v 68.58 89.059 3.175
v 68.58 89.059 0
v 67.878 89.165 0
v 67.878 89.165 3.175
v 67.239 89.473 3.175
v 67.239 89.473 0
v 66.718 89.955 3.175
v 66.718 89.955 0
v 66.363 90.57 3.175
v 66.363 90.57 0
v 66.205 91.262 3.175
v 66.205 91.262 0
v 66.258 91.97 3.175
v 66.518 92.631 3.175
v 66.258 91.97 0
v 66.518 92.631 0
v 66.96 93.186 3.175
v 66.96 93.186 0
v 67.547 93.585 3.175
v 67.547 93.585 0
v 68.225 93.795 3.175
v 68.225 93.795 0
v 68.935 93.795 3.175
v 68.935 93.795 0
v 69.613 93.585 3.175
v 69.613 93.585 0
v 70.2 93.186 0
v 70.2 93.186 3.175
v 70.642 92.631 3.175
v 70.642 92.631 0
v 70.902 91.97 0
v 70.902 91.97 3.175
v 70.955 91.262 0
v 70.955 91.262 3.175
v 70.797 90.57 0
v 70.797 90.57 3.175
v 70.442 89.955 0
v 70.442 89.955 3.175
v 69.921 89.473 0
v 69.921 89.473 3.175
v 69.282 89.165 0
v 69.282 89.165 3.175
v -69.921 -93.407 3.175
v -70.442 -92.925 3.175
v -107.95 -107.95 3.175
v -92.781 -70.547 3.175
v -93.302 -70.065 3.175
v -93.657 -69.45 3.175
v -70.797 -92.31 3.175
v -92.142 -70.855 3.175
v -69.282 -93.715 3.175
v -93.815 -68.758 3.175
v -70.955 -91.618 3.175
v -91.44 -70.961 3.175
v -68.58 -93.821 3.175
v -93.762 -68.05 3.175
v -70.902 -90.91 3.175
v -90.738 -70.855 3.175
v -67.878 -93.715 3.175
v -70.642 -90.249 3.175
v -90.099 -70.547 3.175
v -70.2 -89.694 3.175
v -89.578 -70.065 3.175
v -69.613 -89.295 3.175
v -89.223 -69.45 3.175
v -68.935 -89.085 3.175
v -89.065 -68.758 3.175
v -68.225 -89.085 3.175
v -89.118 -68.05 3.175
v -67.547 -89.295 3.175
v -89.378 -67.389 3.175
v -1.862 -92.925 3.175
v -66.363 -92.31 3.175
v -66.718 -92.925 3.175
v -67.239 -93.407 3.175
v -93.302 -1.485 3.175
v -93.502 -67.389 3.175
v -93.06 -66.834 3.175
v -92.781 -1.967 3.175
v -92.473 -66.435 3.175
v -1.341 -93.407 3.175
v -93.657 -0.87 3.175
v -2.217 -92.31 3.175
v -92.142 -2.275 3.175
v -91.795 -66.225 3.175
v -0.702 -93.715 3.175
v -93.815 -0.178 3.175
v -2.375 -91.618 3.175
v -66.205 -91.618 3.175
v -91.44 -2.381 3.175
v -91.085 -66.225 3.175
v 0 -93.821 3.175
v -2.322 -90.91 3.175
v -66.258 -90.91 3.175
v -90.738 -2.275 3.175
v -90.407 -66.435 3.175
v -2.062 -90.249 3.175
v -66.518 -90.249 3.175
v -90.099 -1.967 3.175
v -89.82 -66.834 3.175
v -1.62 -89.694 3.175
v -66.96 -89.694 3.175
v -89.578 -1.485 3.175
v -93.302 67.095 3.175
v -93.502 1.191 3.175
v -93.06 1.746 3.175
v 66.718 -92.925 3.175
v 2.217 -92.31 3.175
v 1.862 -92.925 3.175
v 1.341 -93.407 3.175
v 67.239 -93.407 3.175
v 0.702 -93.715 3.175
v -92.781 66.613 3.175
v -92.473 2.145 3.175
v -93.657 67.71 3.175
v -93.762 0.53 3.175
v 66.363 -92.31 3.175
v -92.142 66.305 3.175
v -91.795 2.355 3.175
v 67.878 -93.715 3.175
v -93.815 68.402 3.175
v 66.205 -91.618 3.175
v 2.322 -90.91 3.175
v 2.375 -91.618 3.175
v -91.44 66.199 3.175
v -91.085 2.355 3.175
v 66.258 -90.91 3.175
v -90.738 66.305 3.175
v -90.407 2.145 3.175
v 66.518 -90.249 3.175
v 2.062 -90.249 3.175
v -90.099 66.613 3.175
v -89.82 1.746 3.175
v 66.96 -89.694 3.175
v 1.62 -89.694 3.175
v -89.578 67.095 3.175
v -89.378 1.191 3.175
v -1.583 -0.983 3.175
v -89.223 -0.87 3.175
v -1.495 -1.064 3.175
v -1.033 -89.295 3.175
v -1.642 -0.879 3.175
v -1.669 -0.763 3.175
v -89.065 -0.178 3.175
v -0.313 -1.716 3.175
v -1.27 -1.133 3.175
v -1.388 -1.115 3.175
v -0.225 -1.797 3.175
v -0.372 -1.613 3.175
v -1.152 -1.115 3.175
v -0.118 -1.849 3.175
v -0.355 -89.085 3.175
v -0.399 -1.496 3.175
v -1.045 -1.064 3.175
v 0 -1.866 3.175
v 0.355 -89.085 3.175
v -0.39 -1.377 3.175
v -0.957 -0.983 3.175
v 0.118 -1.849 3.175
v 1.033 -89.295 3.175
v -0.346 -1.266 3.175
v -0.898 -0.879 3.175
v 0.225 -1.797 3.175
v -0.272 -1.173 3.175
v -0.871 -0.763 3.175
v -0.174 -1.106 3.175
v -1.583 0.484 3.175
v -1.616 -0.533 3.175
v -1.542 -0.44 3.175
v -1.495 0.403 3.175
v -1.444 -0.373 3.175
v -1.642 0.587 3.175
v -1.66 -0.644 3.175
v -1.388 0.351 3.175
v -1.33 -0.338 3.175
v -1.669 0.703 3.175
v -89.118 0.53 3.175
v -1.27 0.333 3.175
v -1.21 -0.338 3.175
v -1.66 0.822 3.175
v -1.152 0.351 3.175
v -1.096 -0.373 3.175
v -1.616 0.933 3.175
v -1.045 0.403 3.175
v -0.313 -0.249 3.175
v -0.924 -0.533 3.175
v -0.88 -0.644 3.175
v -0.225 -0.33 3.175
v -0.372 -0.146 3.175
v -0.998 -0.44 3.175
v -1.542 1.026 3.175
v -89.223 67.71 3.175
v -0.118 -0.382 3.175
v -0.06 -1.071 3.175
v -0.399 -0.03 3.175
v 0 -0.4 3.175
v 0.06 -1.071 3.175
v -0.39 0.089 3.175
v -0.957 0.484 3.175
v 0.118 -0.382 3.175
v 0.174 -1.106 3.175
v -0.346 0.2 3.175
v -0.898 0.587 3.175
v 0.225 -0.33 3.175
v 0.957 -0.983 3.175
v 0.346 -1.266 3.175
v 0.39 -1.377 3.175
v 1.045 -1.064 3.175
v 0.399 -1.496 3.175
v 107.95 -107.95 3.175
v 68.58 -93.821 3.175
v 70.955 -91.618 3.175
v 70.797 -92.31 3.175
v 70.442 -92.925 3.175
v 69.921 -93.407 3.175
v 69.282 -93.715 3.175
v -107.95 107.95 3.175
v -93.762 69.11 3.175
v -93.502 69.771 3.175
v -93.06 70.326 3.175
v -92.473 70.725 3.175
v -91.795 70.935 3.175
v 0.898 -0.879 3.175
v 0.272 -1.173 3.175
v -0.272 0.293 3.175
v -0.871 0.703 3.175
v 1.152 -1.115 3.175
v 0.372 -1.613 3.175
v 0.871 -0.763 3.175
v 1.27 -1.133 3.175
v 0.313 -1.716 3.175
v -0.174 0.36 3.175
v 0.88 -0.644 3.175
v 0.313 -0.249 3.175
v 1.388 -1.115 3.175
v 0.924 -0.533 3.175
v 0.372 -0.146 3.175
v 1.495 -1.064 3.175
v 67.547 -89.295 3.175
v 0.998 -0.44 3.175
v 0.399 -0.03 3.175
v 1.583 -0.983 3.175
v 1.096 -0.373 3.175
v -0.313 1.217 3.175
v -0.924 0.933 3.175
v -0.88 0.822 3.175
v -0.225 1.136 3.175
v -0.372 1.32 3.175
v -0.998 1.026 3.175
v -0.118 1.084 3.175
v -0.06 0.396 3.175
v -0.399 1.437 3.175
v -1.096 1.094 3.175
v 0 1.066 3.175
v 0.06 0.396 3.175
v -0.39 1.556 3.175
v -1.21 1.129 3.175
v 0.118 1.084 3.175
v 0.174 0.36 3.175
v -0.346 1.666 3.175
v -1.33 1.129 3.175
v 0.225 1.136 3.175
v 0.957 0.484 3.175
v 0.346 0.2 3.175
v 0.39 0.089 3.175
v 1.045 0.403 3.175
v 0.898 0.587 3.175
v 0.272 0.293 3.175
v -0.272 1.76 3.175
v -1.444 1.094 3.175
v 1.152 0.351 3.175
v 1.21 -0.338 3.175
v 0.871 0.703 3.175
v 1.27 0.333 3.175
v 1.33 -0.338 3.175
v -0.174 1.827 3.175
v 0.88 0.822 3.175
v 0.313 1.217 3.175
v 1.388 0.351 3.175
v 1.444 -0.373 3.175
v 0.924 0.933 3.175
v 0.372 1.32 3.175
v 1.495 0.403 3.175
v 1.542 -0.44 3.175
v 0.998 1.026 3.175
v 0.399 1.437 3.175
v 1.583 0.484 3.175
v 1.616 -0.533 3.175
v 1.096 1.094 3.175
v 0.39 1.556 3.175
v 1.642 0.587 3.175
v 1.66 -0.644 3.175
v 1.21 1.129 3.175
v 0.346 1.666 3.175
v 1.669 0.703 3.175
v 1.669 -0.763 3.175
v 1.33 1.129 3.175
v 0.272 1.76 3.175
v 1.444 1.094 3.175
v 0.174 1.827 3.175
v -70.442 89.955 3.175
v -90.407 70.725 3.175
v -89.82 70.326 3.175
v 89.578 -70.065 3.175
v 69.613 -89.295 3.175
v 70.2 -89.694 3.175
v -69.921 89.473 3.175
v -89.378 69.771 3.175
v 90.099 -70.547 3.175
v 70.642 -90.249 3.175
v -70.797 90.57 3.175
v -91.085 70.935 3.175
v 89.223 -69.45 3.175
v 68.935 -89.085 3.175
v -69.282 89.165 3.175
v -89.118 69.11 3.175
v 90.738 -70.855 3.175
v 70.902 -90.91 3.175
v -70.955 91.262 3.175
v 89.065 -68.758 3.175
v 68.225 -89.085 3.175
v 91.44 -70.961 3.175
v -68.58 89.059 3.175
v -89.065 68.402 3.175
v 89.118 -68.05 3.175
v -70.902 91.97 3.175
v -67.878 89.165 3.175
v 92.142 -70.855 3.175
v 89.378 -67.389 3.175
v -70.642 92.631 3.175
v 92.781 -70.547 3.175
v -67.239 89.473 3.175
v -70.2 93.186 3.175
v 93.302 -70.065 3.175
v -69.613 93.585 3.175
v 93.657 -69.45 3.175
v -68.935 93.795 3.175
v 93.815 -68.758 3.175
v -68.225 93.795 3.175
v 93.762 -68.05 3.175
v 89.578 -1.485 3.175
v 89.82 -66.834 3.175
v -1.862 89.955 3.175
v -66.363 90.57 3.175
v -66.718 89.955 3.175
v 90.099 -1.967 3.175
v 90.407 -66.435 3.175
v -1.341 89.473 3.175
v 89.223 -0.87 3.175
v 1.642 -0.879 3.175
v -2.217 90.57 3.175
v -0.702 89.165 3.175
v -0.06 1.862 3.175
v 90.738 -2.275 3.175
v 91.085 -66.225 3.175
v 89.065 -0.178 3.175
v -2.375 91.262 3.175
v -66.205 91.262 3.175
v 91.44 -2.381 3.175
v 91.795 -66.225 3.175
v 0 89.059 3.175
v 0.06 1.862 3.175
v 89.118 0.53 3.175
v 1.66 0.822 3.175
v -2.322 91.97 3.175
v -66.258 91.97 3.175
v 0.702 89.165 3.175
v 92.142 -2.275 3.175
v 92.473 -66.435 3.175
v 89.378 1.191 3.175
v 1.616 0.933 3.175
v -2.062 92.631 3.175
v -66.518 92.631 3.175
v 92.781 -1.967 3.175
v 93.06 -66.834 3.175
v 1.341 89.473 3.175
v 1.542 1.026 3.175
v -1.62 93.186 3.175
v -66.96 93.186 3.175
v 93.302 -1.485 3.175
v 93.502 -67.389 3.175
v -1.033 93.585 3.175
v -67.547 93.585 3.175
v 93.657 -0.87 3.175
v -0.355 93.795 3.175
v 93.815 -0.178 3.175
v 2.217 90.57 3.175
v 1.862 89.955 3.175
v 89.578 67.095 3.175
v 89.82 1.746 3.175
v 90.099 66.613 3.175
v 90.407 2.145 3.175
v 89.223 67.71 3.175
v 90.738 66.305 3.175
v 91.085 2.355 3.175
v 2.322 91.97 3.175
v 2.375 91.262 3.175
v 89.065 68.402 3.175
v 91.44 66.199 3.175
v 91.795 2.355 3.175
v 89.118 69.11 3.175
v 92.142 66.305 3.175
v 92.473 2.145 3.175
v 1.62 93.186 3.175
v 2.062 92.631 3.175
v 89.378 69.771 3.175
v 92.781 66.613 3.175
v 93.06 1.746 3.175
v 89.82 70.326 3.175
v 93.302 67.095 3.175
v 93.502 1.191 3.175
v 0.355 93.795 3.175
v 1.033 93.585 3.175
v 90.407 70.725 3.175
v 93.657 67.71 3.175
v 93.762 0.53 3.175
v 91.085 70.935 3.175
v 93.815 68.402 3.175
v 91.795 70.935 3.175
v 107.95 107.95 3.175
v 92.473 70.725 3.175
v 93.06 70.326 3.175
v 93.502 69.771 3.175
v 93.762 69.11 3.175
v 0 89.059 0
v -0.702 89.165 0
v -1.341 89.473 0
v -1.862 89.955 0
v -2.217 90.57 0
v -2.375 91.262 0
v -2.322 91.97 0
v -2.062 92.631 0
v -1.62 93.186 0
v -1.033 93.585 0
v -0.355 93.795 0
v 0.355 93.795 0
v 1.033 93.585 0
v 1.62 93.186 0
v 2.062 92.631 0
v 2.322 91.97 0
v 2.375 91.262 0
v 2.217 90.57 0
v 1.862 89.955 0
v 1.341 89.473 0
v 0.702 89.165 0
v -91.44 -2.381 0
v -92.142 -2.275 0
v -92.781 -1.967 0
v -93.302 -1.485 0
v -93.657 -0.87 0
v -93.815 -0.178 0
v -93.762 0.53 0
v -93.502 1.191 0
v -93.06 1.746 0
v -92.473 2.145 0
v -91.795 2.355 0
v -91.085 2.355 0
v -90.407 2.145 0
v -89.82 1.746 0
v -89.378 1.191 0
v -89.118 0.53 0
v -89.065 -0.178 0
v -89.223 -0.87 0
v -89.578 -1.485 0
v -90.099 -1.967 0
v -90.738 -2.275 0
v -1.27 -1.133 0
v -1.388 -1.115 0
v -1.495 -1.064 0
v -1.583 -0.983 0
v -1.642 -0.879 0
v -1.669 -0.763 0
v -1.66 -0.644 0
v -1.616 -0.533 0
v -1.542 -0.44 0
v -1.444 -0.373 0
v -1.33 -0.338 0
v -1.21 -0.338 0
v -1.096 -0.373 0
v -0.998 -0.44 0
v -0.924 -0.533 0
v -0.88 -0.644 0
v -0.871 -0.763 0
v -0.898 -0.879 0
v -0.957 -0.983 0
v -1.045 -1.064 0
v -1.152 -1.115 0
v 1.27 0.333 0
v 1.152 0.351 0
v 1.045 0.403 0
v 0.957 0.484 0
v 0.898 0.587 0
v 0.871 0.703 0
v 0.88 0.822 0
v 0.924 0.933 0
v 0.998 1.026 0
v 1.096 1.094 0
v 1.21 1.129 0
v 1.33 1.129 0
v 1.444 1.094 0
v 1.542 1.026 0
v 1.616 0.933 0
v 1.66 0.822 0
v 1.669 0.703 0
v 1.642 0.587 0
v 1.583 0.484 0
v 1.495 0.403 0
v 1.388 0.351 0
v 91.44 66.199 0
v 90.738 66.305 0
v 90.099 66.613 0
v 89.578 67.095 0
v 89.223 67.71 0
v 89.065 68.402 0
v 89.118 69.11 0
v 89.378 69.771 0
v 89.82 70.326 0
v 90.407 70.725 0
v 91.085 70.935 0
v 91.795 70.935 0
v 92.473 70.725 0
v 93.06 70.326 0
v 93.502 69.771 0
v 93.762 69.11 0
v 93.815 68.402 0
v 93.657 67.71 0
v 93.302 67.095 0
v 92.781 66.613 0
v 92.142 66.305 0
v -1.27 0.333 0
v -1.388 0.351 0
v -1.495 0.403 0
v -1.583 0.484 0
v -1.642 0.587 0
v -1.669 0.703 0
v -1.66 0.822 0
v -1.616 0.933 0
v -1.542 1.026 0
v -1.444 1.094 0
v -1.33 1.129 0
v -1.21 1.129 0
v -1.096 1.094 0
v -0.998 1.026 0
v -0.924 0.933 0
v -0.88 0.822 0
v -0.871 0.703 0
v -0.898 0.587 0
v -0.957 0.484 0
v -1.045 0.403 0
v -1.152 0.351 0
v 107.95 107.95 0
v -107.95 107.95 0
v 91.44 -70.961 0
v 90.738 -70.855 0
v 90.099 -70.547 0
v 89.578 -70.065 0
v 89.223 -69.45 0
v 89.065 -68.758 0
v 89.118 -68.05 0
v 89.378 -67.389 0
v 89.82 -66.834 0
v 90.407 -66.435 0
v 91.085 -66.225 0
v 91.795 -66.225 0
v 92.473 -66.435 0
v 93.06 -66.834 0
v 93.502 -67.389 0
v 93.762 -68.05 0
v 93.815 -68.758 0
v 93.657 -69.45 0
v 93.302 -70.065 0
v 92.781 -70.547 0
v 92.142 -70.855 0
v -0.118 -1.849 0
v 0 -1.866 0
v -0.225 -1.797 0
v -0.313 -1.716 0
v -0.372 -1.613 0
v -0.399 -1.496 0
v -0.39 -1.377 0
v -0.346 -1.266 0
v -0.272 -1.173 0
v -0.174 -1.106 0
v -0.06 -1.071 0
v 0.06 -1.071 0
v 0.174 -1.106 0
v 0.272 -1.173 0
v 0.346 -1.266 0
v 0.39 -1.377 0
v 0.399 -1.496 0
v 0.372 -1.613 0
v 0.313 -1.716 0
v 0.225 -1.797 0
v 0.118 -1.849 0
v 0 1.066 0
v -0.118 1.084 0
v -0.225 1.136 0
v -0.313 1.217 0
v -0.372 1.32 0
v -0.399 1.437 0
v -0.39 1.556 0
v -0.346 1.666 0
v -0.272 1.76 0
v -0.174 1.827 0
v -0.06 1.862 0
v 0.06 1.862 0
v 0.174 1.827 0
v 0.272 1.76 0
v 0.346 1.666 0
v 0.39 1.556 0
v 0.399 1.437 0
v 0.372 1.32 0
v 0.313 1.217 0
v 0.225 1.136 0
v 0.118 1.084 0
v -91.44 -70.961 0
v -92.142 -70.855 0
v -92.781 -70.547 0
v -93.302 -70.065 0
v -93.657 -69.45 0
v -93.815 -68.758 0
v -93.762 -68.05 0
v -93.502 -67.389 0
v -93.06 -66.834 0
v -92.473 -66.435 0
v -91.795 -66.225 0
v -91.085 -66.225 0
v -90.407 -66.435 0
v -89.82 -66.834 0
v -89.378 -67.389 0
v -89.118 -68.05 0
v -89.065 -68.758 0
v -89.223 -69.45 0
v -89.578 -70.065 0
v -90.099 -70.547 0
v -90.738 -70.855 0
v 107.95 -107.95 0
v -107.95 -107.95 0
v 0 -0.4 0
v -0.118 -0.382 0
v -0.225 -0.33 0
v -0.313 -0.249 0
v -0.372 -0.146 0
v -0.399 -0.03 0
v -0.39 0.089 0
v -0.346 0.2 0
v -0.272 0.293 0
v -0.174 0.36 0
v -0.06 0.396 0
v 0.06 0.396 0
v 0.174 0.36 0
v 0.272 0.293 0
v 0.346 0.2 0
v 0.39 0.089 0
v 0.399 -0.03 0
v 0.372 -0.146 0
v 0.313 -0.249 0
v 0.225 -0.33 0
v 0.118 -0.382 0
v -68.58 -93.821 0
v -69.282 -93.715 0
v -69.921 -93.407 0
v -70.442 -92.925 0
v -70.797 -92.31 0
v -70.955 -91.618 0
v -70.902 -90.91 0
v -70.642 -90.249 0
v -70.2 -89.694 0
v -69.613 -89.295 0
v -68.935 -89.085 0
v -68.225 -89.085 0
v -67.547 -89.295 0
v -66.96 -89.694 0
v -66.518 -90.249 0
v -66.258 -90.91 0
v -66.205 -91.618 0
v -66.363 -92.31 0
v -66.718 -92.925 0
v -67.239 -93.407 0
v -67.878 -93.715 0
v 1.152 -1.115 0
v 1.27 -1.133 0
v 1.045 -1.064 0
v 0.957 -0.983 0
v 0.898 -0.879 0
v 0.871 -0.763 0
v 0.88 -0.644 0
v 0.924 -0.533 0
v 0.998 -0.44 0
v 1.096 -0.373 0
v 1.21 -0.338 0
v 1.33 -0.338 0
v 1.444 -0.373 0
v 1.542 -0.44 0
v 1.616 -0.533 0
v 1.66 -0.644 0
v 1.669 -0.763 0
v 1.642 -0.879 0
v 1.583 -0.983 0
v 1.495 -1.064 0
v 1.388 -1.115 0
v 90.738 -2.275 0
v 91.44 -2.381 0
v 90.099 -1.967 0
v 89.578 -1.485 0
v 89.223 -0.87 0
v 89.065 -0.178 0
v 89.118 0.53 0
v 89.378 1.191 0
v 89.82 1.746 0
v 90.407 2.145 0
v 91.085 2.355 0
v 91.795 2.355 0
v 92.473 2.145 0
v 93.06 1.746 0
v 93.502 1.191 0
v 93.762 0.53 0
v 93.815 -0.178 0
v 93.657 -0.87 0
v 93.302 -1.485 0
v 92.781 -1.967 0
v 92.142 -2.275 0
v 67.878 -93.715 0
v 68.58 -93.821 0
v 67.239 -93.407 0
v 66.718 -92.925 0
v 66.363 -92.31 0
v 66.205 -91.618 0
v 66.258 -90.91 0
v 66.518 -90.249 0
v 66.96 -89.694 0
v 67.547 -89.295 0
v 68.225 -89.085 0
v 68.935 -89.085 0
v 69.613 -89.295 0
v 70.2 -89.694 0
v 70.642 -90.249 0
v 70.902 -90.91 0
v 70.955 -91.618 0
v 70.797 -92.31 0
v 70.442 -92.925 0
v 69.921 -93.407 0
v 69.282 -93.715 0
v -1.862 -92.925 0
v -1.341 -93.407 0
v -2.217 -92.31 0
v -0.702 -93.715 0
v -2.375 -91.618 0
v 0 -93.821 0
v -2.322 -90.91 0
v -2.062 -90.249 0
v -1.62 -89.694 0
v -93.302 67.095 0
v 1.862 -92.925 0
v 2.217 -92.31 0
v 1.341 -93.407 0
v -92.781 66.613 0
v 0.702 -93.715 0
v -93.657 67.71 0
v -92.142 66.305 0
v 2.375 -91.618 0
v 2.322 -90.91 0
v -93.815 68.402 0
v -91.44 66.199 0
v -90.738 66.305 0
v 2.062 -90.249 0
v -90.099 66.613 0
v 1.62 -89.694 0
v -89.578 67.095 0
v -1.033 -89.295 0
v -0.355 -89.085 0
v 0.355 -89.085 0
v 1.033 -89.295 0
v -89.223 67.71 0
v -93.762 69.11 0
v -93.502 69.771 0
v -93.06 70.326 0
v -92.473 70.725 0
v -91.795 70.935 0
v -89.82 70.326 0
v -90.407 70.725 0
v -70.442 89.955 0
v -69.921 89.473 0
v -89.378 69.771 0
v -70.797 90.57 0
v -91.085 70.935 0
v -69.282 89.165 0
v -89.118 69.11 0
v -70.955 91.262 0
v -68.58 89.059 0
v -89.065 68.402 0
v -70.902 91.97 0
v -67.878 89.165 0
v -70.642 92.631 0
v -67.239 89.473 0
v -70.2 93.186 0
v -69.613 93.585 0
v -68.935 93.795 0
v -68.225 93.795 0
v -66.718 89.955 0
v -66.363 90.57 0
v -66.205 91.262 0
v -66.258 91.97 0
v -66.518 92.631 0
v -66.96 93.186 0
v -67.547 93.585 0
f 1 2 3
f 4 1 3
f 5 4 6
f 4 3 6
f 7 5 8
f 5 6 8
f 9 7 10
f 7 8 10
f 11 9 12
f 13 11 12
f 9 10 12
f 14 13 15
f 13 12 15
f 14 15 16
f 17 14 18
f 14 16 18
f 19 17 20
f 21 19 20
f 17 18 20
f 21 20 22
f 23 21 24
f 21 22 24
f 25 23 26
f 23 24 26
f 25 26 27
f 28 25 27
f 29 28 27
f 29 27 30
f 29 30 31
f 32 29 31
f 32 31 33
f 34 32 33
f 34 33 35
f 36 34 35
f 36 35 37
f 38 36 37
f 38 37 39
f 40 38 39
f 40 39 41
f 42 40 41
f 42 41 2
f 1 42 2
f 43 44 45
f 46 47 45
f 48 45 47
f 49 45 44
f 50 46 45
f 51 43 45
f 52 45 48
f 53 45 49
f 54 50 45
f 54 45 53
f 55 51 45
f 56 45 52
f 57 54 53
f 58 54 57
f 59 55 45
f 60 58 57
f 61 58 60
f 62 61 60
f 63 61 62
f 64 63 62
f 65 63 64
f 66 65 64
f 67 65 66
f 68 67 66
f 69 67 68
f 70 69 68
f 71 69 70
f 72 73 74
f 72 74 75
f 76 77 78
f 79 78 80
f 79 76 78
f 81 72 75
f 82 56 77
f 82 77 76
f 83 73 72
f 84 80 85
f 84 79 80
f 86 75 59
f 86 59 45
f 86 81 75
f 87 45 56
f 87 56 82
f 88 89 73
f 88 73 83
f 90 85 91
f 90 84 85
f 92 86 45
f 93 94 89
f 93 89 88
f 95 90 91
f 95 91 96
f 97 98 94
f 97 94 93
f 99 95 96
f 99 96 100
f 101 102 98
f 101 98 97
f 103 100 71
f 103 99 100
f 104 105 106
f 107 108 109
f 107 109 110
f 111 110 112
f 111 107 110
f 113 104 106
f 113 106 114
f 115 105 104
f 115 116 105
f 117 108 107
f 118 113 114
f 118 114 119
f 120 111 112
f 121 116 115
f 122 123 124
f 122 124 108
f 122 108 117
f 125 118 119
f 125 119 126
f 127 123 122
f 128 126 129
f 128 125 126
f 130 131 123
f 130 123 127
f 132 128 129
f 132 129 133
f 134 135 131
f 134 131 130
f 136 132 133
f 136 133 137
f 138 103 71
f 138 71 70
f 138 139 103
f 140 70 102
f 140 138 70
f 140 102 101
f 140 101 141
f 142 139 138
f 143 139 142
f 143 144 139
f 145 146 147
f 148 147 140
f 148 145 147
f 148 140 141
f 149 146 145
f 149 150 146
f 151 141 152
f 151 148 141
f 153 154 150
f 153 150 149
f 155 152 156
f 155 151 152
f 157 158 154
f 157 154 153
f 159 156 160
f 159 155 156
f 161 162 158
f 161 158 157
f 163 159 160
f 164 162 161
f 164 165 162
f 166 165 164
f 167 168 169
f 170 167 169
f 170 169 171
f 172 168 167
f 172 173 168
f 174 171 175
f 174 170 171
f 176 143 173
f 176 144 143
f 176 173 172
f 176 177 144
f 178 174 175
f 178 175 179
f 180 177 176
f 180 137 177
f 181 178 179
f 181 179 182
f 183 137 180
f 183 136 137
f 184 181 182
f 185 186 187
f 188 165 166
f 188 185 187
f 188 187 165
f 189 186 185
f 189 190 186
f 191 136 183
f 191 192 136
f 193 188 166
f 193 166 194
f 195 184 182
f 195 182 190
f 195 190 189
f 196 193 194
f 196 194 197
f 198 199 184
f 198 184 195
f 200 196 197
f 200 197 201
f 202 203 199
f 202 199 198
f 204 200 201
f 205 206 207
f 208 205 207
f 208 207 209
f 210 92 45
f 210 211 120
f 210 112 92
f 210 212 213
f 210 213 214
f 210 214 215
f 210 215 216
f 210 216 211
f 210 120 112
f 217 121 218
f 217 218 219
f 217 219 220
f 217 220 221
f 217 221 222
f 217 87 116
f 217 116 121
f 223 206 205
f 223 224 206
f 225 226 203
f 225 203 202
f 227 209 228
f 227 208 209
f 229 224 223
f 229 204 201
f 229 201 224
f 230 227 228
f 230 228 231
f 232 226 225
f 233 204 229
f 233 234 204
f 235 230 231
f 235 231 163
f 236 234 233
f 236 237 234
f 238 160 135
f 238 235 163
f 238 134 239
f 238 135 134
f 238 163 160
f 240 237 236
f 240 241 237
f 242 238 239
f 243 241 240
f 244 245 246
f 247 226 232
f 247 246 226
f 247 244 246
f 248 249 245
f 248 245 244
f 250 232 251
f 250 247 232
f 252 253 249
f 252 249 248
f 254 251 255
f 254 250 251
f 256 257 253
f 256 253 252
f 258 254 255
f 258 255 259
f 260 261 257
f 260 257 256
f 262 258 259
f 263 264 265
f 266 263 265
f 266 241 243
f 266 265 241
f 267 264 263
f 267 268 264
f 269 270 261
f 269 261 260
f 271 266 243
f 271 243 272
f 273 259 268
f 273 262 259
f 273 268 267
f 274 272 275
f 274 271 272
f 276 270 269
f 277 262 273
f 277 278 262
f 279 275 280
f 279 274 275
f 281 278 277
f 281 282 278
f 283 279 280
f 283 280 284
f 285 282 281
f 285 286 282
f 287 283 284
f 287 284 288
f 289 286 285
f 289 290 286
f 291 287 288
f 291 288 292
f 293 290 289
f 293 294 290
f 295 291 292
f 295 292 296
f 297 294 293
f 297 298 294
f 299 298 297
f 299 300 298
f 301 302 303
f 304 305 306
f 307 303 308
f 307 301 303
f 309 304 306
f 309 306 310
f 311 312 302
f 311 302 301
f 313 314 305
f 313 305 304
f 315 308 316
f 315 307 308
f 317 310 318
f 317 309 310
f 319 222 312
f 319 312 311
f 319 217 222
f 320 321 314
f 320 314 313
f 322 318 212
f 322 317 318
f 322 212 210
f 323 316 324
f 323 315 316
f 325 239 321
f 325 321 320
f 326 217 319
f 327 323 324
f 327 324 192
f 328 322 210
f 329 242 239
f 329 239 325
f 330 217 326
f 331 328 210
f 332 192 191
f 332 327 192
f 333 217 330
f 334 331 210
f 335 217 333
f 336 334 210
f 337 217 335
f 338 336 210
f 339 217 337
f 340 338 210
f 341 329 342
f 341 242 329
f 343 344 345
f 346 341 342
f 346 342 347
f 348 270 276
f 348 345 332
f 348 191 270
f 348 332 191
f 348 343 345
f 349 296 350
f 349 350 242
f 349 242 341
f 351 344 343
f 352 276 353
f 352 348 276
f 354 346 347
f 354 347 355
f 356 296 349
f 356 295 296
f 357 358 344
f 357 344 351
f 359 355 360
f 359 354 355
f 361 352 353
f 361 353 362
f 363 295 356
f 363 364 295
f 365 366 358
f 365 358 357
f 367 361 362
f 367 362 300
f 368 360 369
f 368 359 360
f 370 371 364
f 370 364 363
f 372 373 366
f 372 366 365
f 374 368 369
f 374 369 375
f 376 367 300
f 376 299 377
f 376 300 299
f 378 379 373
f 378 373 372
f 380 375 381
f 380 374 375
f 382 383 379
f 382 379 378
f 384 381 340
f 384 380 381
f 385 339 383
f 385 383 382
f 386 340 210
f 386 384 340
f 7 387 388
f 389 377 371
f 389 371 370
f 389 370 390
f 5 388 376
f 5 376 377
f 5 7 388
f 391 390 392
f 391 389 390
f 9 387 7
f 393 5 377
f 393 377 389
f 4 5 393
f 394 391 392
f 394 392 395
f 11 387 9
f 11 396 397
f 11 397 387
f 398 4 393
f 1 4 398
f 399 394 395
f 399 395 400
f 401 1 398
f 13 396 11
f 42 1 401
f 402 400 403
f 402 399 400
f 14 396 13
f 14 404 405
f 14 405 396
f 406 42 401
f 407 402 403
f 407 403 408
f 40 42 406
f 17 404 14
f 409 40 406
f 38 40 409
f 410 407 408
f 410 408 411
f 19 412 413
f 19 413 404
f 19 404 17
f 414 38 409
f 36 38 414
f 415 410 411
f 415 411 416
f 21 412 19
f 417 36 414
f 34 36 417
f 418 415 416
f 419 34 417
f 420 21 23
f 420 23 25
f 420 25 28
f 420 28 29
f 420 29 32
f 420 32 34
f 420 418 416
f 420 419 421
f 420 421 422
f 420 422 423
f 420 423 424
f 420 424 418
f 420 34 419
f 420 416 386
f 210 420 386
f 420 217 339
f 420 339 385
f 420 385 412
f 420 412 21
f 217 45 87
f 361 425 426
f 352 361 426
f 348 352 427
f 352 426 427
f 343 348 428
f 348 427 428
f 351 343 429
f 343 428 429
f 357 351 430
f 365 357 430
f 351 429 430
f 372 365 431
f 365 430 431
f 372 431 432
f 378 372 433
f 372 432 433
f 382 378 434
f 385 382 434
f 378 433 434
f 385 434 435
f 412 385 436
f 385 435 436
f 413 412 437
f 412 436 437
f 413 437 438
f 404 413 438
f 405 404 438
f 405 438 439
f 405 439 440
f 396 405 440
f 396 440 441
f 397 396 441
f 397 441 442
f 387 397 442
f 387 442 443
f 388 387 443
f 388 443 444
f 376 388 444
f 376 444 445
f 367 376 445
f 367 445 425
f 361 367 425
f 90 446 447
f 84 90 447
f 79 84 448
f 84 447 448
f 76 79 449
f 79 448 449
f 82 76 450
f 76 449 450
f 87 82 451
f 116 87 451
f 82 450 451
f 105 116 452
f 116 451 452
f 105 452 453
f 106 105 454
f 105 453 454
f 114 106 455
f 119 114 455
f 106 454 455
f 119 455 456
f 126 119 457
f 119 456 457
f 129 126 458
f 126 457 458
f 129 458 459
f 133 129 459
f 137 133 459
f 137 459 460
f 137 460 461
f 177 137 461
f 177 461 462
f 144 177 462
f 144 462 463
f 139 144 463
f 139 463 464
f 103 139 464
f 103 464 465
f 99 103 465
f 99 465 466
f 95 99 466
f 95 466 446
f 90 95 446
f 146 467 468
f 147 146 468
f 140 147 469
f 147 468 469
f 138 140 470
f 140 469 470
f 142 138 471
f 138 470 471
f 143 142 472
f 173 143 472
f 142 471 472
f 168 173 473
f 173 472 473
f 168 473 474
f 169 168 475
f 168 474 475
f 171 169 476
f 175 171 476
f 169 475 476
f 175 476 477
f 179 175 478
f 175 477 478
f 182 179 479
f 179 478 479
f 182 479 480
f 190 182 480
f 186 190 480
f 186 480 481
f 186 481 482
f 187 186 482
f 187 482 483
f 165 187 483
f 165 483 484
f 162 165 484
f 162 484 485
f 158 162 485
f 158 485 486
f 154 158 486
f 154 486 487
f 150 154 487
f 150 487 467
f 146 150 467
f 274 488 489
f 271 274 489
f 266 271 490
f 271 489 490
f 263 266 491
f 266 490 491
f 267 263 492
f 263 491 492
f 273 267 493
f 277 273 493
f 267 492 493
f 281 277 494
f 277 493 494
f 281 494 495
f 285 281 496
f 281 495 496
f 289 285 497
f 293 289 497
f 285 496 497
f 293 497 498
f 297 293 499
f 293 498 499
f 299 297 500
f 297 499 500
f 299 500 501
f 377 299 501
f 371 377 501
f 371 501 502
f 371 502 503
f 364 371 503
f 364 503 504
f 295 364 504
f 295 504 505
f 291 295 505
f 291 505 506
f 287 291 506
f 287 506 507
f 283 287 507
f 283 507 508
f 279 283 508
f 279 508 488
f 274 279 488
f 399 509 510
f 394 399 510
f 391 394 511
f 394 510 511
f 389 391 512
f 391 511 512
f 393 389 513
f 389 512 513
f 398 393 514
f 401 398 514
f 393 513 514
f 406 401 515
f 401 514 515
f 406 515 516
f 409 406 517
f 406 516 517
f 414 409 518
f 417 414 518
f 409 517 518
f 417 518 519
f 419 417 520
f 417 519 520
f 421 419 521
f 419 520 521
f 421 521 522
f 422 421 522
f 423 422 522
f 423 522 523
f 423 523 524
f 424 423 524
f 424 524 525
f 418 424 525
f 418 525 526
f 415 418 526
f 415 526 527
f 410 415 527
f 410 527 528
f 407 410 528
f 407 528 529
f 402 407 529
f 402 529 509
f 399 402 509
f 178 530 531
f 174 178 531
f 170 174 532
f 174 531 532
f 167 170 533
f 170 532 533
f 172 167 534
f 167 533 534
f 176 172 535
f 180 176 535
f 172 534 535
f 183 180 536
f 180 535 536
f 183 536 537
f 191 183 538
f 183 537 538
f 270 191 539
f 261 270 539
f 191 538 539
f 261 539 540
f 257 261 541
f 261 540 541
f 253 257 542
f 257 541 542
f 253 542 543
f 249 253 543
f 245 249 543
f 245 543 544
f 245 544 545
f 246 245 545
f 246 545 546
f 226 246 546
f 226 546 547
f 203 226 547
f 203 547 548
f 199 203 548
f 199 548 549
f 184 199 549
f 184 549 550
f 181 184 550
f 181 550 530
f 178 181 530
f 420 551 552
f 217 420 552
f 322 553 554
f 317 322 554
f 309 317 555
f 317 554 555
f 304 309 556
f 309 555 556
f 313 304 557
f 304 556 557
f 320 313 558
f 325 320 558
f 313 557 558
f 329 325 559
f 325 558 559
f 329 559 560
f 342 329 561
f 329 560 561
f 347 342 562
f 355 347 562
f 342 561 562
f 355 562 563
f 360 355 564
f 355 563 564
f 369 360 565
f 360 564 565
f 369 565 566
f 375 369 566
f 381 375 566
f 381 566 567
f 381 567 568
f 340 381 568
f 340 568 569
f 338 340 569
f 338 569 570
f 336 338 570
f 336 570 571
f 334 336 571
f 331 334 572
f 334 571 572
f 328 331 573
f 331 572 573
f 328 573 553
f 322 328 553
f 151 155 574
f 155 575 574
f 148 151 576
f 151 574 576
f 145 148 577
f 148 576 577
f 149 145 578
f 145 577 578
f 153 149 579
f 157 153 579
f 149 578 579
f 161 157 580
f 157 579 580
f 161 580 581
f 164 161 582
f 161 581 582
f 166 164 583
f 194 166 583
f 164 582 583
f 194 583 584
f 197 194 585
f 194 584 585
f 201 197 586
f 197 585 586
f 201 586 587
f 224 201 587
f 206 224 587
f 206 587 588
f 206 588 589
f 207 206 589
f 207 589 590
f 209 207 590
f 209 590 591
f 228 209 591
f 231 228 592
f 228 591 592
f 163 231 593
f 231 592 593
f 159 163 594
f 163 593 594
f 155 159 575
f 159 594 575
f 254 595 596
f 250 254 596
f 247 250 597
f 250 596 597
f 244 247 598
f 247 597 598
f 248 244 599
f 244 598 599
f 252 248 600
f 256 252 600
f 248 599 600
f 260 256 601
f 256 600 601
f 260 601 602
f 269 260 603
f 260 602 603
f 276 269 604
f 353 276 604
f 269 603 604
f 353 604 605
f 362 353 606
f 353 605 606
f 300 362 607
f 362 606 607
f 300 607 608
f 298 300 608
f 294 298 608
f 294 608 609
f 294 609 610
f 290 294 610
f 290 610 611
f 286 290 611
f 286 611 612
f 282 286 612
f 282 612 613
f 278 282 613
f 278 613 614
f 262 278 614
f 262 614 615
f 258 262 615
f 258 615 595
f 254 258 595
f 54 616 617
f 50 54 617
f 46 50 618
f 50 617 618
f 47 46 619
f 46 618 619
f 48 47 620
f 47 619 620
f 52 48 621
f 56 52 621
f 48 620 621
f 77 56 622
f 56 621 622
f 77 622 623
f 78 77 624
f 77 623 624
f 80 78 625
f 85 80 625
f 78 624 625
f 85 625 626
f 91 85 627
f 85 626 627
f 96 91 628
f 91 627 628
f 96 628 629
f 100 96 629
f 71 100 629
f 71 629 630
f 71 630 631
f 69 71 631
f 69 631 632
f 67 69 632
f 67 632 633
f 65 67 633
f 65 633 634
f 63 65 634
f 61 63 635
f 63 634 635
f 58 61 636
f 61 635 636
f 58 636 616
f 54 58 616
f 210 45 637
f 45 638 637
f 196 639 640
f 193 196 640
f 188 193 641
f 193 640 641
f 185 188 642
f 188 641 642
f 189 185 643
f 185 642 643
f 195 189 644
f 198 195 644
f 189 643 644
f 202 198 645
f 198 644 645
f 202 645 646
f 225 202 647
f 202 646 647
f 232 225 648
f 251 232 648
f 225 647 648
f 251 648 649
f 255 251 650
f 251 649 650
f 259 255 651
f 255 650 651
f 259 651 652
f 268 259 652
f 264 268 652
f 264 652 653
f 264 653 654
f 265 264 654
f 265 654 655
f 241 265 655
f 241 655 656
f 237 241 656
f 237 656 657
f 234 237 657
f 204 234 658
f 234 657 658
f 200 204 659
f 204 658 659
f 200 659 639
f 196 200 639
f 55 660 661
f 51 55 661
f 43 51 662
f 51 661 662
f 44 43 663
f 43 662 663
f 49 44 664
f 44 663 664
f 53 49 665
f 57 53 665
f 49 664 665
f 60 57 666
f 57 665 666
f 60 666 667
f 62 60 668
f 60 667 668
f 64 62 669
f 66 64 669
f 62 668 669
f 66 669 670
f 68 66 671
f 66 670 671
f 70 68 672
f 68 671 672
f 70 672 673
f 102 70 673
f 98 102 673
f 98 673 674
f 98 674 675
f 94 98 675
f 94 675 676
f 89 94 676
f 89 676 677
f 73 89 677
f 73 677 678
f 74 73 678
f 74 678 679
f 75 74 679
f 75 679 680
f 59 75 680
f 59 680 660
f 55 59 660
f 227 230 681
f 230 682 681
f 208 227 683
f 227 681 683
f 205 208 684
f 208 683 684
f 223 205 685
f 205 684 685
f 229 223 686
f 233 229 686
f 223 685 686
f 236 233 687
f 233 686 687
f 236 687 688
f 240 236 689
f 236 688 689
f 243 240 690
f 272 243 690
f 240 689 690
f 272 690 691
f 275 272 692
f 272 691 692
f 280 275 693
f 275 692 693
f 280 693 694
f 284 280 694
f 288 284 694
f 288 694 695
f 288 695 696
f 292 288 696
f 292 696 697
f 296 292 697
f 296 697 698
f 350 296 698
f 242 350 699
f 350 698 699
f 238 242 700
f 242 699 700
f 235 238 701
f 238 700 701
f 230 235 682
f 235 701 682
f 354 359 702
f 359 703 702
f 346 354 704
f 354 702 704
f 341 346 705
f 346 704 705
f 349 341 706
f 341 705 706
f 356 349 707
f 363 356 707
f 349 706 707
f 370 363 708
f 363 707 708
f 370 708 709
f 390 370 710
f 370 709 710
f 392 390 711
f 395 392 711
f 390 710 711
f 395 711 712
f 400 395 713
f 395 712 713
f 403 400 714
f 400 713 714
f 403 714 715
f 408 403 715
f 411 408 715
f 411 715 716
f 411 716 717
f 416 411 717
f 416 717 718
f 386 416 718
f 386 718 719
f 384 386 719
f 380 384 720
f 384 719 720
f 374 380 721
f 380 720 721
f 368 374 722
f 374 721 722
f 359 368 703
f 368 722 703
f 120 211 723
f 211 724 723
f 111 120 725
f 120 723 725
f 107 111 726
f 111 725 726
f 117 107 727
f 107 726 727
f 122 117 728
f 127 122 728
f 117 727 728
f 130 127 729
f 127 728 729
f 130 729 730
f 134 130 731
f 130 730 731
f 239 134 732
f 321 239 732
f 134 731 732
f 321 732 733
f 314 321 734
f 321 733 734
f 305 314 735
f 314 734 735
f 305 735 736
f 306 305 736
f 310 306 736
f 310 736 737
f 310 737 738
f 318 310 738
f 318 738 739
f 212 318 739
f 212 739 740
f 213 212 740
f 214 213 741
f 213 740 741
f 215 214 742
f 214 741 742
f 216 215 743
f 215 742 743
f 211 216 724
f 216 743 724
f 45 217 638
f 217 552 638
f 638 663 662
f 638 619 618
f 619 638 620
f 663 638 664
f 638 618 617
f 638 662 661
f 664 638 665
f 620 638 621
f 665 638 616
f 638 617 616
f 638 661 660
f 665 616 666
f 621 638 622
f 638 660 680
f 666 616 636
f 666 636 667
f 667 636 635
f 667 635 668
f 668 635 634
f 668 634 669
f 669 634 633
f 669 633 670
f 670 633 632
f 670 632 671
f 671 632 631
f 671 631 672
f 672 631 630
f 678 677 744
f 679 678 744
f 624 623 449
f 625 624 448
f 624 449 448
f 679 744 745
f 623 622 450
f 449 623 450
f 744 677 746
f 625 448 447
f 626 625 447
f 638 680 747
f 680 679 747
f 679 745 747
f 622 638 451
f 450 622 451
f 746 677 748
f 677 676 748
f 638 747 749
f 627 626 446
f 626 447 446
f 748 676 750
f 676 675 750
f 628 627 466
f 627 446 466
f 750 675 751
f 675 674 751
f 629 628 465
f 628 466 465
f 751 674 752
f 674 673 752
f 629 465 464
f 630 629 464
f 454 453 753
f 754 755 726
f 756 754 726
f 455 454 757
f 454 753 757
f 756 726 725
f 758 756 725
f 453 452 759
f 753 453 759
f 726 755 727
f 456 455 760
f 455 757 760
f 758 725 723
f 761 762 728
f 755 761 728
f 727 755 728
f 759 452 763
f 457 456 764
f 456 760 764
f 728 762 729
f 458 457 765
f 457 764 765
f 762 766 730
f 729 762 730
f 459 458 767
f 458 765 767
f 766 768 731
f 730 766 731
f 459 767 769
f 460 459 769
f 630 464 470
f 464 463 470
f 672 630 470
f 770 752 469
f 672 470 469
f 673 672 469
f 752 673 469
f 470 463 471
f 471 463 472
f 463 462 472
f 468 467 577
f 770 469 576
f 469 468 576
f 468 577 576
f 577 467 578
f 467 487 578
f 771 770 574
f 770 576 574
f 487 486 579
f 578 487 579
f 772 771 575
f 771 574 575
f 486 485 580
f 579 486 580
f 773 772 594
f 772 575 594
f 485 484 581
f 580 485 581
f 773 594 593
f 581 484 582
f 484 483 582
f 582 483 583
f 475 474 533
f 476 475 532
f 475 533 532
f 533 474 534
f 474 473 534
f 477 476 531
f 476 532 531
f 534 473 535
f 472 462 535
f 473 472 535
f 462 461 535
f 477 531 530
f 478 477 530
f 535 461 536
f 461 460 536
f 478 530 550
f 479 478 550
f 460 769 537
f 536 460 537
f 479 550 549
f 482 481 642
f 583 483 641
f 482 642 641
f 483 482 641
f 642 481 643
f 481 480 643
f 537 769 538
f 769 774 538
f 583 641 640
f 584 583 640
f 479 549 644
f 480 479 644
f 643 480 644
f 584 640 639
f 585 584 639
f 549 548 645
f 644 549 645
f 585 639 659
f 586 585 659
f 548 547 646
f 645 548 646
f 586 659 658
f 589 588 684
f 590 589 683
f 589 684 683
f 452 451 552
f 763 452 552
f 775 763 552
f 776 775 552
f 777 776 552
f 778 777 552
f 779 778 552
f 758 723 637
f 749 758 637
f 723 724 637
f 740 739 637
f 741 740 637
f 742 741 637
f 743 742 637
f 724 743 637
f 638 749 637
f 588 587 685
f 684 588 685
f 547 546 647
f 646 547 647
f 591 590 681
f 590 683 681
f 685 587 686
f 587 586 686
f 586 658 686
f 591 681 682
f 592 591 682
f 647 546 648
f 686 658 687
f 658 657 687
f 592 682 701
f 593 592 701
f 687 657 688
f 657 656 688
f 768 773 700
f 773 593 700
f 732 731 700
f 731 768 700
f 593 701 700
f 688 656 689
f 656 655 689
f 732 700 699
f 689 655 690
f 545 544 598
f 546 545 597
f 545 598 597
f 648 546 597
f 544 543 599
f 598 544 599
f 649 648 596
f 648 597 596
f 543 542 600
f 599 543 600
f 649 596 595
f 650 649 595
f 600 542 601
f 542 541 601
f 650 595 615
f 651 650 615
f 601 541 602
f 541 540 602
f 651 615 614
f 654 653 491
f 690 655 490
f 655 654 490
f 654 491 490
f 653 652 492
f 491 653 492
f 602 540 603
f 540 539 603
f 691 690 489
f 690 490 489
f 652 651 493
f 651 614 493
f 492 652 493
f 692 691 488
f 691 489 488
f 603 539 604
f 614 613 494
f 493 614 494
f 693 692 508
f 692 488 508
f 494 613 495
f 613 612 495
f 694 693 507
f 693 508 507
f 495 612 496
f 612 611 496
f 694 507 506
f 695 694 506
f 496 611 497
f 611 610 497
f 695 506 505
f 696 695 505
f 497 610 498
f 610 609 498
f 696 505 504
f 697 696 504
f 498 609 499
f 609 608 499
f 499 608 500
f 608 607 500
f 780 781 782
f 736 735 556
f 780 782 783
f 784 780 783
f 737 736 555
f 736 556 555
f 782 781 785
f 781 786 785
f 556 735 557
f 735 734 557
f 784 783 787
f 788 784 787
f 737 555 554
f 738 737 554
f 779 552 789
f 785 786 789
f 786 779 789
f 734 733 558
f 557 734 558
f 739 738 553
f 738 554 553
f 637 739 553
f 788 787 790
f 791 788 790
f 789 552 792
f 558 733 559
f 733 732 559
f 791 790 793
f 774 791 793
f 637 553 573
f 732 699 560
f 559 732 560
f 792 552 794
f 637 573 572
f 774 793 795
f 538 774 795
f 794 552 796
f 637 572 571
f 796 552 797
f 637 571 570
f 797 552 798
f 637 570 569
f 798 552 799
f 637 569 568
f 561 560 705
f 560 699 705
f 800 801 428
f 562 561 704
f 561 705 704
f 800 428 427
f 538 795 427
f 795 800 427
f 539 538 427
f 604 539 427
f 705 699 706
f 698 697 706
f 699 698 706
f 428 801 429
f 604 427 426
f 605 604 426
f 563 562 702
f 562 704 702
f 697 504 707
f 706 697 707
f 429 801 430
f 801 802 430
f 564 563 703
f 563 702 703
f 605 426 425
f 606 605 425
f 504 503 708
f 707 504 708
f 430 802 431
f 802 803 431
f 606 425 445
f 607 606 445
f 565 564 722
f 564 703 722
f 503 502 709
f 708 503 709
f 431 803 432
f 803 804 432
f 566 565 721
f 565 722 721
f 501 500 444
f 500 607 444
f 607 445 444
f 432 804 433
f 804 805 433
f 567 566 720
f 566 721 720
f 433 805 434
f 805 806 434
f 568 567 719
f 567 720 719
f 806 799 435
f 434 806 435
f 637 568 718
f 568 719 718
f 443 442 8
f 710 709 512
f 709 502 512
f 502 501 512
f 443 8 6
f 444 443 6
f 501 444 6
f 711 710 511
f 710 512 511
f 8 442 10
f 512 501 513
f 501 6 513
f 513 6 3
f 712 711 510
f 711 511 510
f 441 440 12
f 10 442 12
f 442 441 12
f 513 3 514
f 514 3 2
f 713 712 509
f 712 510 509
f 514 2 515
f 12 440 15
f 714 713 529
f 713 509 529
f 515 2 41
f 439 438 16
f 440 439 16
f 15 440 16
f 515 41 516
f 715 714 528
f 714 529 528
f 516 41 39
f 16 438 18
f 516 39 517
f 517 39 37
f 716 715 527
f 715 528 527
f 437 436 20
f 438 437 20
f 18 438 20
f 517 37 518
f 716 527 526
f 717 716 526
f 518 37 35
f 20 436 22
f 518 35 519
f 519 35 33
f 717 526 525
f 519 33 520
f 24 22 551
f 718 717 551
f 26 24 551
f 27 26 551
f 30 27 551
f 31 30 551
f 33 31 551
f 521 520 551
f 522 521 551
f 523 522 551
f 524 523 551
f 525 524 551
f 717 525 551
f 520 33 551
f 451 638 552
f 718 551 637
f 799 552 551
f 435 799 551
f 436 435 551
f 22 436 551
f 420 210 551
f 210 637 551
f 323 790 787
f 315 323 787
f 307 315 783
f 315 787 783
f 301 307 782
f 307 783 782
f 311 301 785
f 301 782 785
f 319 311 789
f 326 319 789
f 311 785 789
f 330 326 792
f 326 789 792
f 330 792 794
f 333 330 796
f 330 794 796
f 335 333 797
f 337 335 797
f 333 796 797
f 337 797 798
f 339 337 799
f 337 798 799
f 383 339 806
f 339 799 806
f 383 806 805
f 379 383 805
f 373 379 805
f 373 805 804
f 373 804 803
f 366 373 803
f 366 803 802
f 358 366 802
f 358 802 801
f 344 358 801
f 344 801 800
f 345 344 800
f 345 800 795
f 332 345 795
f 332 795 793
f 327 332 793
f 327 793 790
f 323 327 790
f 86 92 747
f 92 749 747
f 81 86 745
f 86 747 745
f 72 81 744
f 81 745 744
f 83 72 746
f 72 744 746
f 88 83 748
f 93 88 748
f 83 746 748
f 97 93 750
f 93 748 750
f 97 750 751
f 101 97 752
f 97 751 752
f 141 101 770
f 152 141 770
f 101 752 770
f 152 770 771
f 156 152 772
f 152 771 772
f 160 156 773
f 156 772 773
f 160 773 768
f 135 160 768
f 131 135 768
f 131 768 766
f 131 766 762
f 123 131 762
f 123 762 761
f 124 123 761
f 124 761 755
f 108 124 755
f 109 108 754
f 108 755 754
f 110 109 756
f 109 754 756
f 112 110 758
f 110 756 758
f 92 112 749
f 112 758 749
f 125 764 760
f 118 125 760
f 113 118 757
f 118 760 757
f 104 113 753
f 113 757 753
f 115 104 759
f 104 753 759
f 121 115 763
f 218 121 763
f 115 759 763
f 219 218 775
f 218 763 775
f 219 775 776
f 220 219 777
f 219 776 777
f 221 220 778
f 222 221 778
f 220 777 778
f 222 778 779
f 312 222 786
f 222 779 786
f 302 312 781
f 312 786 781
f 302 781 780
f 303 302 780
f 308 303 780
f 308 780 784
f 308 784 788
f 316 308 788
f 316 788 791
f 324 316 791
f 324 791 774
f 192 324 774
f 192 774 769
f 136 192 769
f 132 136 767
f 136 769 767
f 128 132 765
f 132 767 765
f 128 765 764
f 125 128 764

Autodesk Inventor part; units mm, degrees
ref_plane "YZ Plane" through (0, 0, 0) normal (1, 0, 0) x (0, 1, 0)
ref_plane "XZ Plane" through (0, 0, 0) normal (0, 1, 0) x (-1, 0, 0)
ref_plane "XY Plane" through (0, 0, 0) normal (0, 0, 1) x (1, 0, 0)
sketch "Sketch1" plane through (0, 0, 0) normal (0, 0, 1) x (1, 0, 0)
  line L0 (-107.95, -107.95) -> (107.95, -107.95)
  line L1 (107.95, -107.95) -> (107.95, 107.95)
  line L2 (107.95, 107.95) -> (-107.95, 107.95)
  line L3 (-107.95, 107.95) -> (-107.95, -107.95)
  line L4 (-107.95, -107.95) -> (107.95, 107.95) construction
  point P0 (0, 0)
  point P1 (0, 0)
  dimension "d0" = 215.9
  dimension "d1" = 215.9
extrude "Extrusion1" add sketch "Sketch1" along normal blind 3.175
sketch "Sketch2" plane through (0, 0, 3.175) normal (0, 0, 1) x (1, 0, 0)
  line L0 (-91.44, -91.44) -> (91.44, -91.44) construction
  line L1 (91.44, -91.44) -> (91.44, 91.44) construction
  line L2 (91.44, 91.44) -> (-91.44, 91.44) construction
  line L3 (-91.44, 91.44) -> (-91.44, -91.44) construction
  line L4 (-91.44, -91.44) -> (91.44, 91.44) construction
  line L5 (-151.13, 0) -> (151.13, 0) construction
  line L6 (0, -151.13) -> (0, 151.13) construction
  point P0 (0, 0)
  point P1 (0, 0)
  point P2 (-68.58, 91.44)
  point P3 (0, 91.44)
  point P4 (68.58, 91.44)
  point P5 (91.44, 68.58)
  point P6 (91.44, 0)
  point P7 (68.58, -91.44)
  point P8 (0, -91.44)
  point P9 (-68.58, -91.44)
  point P10 (-91.44, -68.58)
  point P11 (-91.44, 0)
  point P12 (-91.44, 68.58)
  point P13 (91.44, -68.58)
  dimension "d4" = 182.88
  dimension "d5" = 182.88
  dimension "d6" = 22.86
  dimension "d7" = 22.86
hole "Hole1" at (-68.58, 91.44, 3.175) at (0, 91.44, 3.175) at (68.58, 91.44, 3.175) at (91.44, 68.58, 3.175) at (91.44, 0, 3.175) at (68.58, -91.44, 3.175) at (0, -91.44, 3.175) at (-68.58, -91.44, 3.175) at (-91.44, -68.58, 3.175) at (-91.44, 0, 3.175) at (-91.44, 68.58, 3.175) at (91.44, -68.58, 3.175) direction (0, 0, -1) diameter 4.7625 end through all clearance for "Flat Head Machine Screw (82)" size "#8" standard "Ansi Unified Screw Threads"
sketch "Sketch3" plane through (0, 0, 3.175) normal (0, 0, 1) x (1, 0, 0)
  line L0 (-1.27, -0.7332) -> (-1.27, 0.7332) construction
  line L1 (-1.27, 0.7332) -> (0, 1.4665) construction
  line L2 (0, 1.4665) -> (1.27, 0.7332) construction
  line L3 (1.27, 0.7332) -> (1.27, -0.7332) construction
  line L4 (1.27, -0.7332) -> (0, -1.4665) construction
  line L5 (0, -1.4665) -> (-1.27, -0.7332) construction
  point P0 (0, 0)
  point P1 (0, 0)
  point P2 (0, 0)
  dimension "d23" = 2.54
hole "Hole2" at (0, 0, 3.175) at (0, 1.4665, 3.175) at (1.27, 0.7332, 3.175) at (1.27, -0.7332, 3.175) at (0, -1.4665, 3.175) at (-1.27, -0.7332, 3.175) at (-1.27, 0.7332, 3.175) direction (0, 0, -1) diameter 0.8 end through all
properties part number "J007125" material "ACRYLIC, WHITE 2447"
